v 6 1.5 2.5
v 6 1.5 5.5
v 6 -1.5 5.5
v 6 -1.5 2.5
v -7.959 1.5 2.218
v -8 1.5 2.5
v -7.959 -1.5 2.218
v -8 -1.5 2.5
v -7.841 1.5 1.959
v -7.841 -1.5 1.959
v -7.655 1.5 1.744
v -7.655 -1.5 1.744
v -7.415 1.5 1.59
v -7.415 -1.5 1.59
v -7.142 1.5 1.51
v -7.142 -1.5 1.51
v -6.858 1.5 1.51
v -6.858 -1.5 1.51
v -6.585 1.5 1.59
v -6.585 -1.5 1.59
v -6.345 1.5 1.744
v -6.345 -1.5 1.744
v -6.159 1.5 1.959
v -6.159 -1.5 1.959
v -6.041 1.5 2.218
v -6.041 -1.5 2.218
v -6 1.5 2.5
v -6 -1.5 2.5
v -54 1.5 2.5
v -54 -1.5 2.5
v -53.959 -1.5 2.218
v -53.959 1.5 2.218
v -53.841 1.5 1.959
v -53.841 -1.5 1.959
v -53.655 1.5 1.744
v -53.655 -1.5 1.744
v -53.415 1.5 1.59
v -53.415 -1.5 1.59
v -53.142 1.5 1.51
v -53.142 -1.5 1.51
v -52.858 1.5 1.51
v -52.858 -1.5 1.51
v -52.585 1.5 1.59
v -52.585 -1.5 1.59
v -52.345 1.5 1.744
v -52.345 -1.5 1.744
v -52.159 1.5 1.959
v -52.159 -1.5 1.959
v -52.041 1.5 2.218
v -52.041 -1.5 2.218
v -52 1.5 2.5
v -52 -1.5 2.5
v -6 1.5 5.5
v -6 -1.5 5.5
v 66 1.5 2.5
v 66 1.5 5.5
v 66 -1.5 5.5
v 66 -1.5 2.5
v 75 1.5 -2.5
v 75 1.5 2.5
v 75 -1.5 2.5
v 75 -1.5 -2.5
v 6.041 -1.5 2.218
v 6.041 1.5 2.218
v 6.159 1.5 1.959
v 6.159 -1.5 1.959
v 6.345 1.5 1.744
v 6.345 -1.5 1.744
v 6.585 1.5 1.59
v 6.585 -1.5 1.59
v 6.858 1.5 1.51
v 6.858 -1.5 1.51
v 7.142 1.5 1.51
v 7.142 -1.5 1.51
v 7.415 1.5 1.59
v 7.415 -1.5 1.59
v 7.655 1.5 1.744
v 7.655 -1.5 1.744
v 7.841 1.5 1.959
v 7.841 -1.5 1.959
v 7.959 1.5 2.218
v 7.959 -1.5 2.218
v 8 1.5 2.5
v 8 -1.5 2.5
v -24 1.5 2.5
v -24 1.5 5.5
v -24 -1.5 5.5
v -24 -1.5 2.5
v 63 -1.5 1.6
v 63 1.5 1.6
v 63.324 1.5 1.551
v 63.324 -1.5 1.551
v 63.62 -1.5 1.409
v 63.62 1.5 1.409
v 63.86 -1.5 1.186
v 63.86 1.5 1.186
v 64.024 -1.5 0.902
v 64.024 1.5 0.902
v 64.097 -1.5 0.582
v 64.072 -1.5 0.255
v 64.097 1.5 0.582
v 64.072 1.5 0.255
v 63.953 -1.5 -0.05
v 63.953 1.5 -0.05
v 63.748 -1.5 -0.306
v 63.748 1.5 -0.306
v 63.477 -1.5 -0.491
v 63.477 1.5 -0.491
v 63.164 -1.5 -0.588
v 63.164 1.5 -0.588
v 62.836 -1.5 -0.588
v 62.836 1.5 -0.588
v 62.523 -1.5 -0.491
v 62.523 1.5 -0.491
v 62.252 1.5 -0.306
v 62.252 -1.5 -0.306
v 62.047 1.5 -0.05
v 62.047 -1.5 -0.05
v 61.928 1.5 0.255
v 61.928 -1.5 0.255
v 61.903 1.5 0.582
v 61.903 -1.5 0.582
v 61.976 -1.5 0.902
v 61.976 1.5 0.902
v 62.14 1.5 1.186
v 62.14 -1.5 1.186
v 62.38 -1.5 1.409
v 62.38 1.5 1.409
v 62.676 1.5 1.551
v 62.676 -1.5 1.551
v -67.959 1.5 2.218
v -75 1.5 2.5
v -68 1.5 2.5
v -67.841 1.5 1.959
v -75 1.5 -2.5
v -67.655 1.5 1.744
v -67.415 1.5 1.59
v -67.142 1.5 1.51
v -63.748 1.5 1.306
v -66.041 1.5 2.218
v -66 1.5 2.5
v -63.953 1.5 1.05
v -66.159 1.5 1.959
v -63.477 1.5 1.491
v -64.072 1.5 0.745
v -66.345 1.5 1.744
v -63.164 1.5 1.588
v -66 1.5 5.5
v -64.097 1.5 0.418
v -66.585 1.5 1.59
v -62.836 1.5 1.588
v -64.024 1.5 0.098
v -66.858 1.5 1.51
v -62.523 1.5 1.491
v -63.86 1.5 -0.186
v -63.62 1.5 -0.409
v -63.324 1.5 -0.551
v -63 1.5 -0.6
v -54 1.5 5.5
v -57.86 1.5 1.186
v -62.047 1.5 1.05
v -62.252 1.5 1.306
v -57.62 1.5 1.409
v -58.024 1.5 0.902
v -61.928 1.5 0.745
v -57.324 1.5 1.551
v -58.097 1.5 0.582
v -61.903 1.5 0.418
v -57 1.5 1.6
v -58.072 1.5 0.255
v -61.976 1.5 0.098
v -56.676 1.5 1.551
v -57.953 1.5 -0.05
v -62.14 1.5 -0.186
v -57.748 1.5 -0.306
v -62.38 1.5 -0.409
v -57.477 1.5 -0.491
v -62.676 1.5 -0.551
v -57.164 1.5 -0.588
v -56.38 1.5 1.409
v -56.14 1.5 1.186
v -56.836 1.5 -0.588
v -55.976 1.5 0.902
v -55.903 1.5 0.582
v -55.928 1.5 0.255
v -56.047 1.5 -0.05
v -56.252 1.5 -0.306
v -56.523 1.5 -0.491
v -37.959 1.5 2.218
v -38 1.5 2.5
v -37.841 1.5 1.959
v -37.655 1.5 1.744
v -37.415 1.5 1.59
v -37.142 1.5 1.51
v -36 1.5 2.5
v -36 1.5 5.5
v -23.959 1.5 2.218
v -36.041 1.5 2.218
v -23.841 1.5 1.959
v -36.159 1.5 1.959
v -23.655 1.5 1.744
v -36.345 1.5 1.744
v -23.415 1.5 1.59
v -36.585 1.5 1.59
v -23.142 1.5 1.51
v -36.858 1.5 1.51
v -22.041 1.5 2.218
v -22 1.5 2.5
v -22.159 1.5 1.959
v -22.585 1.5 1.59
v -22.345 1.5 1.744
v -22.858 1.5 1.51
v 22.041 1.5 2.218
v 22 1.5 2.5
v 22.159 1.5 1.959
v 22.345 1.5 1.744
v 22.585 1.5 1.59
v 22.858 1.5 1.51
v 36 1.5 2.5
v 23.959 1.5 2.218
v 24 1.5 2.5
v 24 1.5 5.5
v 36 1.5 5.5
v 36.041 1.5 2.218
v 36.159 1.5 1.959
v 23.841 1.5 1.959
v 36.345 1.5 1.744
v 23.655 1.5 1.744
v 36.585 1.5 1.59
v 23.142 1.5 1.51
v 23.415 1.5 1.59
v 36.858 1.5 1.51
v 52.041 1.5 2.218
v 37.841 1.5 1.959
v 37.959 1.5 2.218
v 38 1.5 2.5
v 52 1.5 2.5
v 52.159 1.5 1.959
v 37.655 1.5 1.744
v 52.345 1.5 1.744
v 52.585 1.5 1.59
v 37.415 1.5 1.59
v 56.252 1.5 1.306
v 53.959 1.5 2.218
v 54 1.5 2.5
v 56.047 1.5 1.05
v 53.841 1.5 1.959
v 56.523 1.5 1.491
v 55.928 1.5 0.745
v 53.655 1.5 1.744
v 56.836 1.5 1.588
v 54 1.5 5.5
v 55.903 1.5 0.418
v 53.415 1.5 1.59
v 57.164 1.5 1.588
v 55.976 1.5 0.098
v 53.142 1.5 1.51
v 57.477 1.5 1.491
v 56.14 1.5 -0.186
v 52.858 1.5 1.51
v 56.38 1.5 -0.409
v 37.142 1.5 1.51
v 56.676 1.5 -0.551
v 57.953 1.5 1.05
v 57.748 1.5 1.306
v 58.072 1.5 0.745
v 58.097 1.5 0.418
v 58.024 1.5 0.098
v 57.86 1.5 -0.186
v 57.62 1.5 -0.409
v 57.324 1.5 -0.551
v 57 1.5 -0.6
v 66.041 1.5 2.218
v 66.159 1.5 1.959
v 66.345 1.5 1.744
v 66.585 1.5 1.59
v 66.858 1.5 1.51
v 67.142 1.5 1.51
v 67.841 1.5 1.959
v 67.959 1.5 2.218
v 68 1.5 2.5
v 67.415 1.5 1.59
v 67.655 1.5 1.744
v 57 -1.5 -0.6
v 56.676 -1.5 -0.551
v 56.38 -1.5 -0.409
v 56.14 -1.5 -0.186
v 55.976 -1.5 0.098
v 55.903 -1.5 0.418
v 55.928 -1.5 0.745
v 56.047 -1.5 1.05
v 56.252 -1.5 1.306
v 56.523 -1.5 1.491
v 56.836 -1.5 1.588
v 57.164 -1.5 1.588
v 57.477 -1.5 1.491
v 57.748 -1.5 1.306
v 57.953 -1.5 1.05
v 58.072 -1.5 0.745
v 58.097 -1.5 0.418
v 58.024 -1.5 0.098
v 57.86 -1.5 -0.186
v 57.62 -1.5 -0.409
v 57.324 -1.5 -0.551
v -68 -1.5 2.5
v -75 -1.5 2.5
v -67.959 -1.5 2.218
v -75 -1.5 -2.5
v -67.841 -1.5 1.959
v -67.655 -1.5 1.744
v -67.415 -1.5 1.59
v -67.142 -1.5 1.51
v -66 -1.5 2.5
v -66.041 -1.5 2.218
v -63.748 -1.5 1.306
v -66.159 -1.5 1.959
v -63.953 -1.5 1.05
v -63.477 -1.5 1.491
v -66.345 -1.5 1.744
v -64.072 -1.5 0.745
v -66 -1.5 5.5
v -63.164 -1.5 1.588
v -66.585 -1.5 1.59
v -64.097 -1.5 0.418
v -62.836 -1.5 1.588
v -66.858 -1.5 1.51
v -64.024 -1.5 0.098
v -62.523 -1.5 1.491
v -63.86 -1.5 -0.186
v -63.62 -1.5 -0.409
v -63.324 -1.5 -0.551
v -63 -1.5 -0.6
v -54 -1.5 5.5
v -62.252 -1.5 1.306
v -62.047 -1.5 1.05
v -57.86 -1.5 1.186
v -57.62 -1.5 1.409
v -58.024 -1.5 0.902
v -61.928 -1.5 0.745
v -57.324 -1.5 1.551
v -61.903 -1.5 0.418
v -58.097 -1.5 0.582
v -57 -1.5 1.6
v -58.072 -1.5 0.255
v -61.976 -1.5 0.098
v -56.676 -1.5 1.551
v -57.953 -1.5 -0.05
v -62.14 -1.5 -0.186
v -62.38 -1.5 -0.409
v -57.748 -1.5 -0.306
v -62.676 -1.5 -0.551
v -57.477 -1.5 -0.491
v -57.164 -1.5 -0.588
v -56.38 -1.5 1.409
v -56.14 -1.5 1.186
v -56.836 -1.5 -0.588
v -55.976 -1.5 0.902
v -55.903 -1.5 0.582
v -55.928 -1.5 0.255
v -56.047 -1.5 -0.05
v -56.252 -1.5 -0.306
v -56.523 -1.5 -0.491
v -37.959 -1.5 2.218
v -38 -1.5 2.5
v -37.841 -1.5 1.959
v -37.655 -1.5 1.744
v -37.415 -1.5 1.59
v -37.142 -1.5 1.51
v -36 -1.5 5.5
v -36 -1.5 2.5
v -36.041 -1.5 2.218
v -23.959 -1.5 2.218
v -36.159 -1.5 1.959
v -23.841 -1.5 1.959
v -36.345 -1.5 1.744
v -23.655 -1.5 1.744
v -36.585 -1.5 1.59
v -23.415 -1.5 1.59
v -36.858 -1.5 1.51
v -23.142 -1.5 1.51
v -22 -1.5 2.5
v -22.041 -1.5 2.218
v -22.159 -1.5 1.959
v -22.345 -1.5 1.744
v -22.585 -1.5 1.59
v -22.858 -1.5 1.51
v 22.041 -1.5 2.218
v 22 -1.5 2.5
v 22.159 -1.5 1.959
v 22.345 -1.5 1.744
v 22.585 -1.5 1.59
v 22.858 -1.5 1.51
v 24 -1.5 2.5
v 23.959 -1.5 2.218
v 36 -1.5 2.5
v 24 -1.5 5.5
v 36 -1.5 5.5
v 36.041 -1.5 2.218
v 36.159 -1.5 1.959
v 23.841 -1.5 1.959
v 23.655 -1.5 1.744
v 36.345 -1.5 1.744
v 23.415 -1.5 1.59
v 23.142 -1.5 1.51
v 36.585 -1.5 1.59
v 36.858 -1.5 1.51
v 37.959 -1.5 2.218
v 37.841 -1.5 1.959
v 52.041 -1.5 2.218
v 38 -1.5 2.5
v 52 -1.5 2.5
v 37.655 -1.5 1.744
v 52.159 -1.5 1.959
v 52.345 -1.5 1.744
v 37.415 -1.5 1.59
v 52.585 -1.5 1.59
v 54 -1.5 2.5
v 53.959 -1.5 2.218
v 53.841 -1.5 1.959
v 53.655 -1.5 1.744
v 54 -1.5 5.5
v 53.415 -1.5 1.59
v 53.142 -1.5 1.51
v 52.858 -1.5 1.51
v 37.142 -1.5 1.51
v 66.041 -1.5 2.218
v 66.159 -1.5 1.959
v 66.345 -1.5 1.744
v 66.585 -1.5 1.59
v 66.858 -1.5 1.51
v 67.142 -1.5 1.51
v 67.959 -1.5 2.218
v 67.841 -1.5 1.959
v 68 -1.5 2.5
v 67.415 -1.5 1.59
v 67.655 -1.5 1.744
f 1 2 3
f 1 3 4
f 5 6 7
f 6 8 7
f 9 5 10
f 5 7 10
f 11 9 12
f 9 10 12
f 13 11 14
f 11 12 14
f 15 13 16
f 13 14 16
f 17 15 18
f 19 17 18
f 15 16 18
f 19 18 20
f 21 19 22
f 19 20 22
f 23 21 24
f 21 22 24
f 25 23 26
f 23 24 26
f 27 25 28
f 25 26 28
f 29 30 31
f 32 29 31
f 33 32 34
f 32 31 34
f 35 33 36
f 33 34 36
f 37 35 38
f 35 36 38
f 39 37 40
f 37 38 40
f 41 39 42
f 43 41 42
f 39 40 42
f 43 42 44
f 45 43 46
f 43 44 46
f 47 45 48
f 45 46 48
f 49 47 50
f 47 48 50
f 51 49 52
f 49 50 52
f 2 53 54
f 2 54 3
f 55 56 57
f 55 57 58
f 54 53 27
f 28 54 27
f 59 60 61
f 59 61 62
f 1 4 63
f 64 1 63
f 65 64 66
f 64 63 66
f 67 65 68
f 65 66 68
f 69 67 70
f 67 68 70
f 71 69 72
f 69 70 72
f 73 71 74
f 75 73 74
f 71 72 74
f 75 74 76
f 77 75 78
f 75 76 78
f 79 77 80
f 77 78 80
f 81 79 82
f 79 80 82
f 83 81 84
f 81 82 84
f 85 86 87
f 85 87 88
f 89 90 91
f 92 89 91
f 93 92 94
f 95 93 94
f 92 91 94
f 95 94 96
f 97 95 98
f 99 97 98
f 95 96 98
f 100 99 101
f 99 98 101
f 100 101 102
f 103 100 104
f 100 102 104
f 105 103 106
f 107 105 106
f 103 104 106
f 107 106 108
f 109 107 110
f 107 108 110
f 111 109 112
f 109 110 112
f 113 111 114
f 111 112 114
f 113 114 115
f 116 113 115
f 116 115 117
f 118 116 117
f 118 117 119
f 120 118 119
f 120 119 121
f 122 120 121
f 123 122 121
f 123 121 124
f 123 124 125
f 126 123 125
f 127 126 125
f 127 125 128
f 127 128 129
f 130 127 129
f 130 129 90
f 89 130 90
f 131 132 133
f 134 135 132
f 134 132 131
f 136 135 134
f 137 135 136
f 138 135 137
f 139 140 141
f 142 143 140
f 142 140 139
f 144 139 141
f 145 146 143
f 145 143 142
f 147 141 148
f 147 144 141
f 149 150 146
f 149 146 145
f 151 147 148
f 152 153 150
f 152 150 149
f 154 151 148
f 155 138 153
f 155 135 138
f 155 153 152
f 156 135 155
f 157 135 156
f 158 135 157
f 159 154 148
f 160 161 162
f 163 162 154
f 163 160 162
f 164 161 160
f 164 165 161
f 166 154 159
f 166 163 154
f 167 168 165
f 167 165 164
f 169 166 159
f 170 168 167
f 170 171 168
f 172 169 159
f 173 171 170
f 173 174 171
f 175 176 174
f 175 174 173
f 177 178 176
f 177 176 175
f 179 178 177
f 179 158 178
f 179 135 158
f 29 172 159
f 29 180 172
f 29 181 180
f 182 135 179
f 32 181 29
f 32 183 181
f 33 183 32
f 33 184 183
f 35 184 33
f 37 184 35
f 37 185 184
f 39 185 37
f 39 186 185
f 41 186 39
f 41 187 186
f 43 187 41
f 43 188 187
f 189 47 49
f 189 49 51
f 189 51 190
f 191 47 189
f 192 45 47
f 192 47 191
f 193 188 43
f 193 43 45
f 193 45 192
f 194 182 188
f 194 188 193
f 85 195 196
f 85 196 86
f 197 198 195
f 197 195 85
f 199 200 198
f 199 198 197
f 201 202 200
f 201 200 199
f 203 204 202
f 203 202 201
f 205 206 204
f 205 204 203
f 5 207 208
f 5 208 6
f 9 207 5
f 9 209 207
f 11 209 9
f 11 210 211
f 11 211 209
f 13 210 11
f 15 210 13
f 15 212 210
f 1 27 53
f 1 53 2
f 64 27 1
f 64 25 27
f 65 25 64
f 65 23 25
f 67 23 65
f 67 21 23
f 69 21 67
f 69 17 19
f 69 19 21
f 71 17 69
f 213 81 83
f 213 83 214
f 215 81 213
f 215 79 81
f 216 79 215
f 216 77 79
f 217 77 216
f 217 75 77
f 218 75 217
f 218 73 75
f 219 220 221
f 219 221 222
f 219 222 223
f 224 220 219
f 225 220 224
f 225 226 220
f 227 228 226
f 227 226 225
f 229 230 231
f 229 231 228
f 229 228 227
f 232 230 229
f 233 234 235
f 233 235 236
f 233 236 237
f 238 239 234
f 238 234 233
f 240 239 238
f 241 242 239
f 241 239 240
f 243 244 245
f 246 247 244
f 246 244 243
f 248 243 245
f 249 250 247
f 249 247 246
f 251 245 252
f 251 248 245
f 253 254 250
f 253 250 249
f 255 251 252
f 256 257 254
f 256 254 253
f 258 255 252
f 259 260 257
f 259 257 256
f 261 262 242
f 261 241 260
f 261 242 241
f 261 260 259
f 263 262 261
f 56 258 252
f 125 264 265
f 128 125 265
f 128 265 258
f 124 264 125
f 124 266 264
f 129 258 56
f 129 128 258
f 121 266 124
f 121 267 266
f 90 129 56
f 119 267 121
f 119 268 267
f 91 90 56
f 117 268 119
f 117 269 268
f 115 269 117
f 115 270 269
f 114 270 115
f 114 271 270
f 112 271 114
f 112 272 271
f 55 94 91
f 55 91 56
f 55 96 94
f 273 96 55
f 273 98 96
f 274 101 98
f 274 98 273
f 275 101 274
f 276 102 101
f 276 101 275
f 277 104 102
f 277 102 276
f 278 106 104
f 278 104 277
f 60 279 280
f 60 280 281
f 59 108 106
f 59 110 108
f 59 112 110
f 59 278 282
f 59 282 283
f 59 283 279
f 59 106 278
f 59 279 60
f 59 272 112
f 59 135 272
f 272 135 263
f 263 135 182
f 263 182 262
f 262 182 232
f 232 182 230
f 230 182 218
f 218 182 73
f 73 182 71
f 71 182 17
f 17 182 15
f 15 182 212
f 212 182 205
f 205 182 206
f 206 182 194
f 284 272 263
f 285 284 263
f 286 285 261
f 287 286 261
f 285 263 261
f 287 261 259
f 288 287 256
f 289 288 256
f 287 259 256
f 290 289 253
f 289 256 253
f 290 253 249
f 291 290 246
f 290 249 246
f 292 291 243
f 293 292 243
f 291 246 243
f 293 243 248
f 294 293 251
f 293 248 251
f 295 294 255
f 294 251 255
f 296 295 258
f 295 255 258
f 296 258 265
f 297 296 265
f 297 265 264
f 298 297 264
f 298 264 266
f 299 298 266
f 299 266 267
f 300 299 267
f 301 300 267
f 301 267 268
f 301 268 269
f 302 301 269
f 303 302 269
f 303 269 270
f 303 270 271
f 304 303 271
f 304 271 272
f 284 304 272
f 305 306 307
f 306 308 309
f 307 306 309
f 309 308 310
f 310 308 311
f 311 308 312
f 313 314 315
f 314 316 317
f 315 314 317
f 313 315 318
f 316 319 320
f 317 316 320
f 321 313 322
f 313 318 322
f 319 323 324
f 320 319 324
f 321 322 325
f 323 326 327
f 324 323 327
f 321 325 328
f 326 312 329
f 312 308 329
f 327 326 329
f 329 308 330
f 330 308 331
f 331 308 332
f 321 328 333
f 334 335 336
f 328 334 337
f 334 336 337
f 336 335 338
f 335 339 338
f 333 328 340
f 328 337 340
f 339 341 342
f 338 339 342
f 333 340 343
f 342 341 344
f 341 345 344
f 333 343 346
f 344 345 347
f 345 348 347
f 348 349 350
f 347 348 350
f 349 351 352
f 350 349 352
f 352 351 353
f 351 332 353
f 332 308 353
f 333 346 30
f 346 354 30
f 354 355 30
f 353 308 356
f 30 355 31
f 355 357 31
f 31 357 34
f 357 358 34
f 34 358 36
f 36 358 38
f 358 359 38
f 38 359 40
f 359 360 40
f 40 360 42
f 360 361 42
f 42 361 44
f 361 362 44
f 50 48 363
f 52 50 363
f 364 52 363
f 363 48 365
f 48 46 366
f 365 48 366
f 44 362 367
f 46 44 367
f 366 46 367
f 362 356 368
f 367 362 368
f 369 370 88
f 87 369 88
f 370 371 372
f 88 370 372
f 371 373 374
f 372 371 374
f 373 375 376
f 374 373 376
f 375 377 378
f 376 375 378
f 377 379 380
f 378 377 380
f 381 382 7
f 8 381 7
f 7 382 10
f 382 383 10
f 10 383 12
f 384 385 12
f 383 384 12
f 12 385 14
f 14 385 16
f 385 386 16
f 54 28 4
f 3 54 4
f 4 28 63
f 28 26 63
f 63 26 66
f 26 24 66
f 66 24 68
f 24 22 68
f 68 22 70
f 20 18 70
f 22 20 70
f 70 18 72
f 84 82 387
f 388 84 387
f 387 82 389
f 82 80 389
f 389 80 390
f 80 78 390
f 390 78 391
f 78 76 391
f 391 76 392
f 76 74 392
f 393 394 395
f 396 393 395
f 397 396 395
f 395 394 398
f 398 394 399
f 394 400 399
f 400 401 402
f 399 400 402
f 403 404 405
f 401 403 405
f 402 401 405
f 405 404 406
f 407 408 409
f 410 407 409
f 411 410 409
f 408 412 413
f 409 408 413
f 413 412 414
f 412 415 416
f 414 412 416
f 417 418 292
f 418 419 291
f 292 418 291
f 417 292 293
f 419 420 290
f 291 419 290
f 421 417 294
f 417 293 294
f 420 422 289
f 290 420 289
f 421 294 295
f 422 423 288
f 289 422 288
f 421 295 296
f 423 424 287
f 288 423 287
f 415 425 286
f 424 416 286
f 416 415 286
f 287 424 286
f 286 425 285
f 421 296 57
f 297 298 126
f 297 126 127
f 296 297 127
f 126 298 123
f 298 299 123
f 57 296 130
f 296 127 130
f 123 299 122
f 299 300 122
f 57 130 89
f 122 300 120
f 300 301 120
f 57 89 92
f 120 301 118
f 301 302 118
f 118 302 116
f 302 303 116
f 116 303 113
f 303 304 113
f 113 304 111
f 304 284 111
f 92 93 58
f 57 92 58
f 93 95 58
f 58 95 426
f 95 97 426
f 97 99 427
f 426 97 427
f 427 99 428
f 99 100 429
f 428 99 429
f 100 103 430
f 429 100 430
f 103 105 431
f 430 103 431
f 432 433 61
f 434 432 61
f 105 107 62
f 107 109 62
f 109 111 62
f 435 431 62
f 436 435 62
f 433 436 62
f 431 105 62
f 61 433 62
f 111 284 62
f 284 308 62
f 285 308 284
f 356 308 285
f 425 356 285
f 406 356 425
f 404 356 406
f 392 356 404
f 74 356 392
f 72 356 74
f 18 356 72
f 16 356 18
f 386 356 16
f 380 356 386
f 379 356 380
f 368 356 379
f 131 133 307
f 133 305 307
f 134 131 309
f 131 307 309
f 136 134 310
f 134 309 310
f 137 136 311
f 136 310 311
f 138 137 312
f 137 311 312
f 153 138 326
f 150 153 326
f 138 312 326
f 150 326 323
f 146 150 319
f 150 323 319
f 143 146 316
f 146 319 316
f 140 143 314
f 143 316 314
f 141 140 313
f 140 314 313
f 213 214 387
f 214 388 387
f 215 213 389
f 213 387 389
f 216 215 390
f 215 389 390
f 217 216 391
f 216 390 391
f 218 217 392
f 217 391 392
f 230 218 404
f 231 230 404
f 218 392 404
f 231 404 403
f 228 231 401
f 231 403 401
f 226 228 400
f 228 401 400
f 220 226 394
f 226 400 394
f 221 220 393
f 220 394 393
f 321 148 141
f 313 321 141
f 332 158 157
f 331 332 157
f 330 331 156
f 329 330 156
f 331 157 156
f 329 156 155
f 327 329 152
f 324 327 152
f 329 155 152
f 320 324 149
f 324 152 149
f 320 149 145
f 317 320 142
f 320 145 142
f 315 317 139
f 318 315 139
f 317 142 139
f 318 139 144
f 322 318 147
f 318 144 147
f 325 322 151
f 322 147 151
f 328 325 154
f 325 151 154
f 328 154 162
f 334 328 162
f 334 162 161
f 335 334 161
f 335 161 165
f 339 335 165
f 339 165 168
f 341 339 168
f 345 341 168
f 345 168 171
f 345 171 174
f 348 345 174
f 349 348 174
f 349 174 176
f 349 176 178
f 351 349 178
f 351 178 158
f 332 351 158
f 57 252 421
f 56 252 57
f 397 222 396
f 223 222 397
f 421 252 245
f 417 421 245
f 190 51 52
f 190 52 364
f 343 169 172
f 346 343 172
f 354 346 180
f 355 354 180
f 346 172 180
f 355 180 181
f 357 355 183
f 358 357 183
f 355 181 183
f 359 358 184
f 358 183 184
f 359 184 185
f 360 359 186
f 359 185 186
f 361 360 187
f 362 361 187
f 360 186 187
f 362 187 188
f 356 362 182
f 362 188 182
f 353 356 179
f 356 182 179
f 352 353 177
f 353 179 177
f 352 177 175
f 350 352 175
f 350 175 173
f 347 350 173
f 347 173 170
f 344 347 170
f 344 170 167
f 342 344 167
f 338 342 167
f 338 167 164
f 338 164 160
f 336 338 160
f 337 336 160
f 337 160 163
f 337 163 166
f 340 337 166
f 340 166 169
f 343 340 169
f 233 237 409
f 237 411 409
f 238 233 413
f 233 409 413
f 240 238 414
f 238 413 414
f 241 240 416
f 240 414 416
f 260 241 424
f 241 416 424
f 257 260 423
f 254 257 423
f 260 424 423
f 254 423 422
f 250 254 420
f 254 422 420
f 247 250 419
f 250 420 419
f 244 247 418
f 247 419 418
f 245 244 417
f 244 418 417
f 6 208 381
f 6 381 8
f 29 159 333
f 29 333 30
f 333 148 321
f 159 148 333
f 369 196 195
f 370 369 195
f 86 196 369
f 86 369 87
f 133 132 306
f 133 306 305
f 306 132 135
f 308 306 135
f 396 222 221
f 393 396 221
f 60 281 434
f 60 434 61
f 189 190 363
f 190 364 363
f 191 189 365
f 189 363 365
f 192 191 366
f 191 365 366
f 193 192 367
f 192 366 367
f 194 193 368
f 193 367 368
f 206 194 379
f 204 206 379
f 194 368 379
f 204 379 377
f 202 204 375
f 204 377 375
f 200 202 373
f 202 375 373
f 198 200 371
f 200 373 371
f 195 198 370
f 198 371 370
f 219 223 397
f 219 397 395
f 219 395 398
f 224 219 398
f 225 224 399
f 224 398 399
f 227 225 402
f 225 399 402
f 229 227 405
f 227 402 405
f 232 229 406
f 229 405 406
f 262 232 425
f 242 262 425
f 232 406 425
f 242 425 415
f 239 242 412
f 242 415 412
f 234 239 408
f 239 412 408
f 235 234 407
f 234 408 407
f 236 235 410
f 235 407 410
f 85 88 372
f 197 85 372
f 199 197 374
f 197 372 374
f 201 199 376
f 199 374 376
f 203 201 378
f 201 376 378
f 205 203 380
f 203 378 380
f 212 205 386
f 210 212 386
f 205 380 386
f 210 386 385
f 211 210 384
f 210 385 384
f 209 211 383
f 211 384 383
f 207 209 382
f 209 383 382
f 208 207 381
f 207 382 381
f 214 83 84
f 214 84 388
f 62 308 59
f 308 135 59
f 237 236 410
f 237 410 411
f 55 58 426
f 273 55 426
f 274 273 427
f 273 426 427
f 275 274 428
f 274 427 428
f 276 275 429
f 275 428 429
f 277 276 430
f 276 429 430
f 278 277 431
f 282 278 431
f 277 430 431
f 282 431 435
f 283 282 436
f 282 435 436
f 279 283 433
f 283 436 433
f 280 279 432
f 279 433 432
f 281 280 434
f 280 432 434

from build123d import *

# Parameters (mm, degrees)
SKETCH_1_W          = 150
SKETCH_1_H          = 5
EXTRUDE_1_DEPTH     = 1.5
SKETCH_2_W          = 12
SKETCH_2_H          = 3
EXTRUDE_2_DEPTH     = 3
SKETCH_3_R          = 1
CUT_EXTRUDE_1_DEPTH = 76.261211789
SKETCH_4_R          = 1.1
CUT_EXTRUDE_2_DEPTH = 76.261211789


with BuildPart() as part:
    # 草图1 → 凸台-拉伸1 (new, symmetric)
    with BuildSketch(Plane(origin=(0, 0, 0), x_dir=(1, 0, 0), z_dir=(0, 1, 0))):
        Rectangle(SKETCH_1_W, SKETCH_1_H)
    extrude(amount=EXTRUDE_1_DEPTH, both=True)

    # 草图2 → 凸台-拉伸2 (add)
    with BuildSketch(Plane(origin=(0, 1.5, 0), x_dir=(1, 0, 0), z_dir=(0, 1, 0))):
        with Locations((-60, -4)):
            Rectangle(SKETCH_2_W, SKETCH_2_H)
        with Locations((-30, -4)):
            Rectangle(SKETCH_2_W, SKETCH_2_H)
        with Locations((0, -4)):
            Rectangle(SKETCH_2_W, SKETCH_2_H)
        with Locations((30, -4)):
            Rectangle(SKETCH_2_W, SKETCH_2_H)
        with Locations((60, -4)):
            Rectangle(SKETCH_2_W, SKETCH_2_H)
    extrude(amount=-EXTRUDE_2_DEPTH)

    # 草图3 → 切除-拉伸1 (cut, through all)
    with BuildSketch(Plane.XZ.offset(1.5)):
        with Locations((67, 2.5)):
            Circle(SKETCH_3_R)
        with Locations((53, 2.5)):
            Circle(SKETCH_3_R)
        with Locations((37, 2.5)):
            Circle(SKETCH_3_R)
        with Locations((23, 2.5)):
            Circle(SKETCH_3_R)
        with Locations((7, 2.5)):
            Circle(SKETCH_3_R)
        with Locations((-7, 2.5)):
            Circle(SKETCH_3_R)
        with Locations((-23, 2.5)):
            Circle(SKETCH_3_R)
        with Locations((-37, 2.5)):
            Circle(SKETCH_3_R)
        with Locations((-53, 2.5)):
            Circle(SKETCH_3_R)
        with Locations((-67, 2.5)):
            Circle(SKETCH_3_R)
    extrude(amount=-CUT_EXTRUDE_1_DEPTH, mode=Mode.SUBTRACT)

    # 草图4 → 切除-拉伸2 (cut, through all)
    with BuildSketch(Plane(origin=(0, 1.5, 0), x_dir=(1, 0, 0), z_dir=(0, 1, 0))):
        with Locations(Location((63, -0.5, 0), (0, 0, 270))):
            Circle(SKETCH_4_R)
        with Locations(Location((57, -0.5, 0), (0, 0, 90))):
            Circle(SKETCH_4_R)
        with Locations(Location((-57, -0.5, 0), (0, 0, 270))):
            Circle(SKETCH_4_R)
        with Locations(Location((-63, -0.5, 0), (0, 0, 90))):
            Circle(SKETCH_4_R)
    extrude(amount=-CUT_EXTRUDE_2_DEPTH, mode=Mode.SUBTRACT)


solid = part.part
